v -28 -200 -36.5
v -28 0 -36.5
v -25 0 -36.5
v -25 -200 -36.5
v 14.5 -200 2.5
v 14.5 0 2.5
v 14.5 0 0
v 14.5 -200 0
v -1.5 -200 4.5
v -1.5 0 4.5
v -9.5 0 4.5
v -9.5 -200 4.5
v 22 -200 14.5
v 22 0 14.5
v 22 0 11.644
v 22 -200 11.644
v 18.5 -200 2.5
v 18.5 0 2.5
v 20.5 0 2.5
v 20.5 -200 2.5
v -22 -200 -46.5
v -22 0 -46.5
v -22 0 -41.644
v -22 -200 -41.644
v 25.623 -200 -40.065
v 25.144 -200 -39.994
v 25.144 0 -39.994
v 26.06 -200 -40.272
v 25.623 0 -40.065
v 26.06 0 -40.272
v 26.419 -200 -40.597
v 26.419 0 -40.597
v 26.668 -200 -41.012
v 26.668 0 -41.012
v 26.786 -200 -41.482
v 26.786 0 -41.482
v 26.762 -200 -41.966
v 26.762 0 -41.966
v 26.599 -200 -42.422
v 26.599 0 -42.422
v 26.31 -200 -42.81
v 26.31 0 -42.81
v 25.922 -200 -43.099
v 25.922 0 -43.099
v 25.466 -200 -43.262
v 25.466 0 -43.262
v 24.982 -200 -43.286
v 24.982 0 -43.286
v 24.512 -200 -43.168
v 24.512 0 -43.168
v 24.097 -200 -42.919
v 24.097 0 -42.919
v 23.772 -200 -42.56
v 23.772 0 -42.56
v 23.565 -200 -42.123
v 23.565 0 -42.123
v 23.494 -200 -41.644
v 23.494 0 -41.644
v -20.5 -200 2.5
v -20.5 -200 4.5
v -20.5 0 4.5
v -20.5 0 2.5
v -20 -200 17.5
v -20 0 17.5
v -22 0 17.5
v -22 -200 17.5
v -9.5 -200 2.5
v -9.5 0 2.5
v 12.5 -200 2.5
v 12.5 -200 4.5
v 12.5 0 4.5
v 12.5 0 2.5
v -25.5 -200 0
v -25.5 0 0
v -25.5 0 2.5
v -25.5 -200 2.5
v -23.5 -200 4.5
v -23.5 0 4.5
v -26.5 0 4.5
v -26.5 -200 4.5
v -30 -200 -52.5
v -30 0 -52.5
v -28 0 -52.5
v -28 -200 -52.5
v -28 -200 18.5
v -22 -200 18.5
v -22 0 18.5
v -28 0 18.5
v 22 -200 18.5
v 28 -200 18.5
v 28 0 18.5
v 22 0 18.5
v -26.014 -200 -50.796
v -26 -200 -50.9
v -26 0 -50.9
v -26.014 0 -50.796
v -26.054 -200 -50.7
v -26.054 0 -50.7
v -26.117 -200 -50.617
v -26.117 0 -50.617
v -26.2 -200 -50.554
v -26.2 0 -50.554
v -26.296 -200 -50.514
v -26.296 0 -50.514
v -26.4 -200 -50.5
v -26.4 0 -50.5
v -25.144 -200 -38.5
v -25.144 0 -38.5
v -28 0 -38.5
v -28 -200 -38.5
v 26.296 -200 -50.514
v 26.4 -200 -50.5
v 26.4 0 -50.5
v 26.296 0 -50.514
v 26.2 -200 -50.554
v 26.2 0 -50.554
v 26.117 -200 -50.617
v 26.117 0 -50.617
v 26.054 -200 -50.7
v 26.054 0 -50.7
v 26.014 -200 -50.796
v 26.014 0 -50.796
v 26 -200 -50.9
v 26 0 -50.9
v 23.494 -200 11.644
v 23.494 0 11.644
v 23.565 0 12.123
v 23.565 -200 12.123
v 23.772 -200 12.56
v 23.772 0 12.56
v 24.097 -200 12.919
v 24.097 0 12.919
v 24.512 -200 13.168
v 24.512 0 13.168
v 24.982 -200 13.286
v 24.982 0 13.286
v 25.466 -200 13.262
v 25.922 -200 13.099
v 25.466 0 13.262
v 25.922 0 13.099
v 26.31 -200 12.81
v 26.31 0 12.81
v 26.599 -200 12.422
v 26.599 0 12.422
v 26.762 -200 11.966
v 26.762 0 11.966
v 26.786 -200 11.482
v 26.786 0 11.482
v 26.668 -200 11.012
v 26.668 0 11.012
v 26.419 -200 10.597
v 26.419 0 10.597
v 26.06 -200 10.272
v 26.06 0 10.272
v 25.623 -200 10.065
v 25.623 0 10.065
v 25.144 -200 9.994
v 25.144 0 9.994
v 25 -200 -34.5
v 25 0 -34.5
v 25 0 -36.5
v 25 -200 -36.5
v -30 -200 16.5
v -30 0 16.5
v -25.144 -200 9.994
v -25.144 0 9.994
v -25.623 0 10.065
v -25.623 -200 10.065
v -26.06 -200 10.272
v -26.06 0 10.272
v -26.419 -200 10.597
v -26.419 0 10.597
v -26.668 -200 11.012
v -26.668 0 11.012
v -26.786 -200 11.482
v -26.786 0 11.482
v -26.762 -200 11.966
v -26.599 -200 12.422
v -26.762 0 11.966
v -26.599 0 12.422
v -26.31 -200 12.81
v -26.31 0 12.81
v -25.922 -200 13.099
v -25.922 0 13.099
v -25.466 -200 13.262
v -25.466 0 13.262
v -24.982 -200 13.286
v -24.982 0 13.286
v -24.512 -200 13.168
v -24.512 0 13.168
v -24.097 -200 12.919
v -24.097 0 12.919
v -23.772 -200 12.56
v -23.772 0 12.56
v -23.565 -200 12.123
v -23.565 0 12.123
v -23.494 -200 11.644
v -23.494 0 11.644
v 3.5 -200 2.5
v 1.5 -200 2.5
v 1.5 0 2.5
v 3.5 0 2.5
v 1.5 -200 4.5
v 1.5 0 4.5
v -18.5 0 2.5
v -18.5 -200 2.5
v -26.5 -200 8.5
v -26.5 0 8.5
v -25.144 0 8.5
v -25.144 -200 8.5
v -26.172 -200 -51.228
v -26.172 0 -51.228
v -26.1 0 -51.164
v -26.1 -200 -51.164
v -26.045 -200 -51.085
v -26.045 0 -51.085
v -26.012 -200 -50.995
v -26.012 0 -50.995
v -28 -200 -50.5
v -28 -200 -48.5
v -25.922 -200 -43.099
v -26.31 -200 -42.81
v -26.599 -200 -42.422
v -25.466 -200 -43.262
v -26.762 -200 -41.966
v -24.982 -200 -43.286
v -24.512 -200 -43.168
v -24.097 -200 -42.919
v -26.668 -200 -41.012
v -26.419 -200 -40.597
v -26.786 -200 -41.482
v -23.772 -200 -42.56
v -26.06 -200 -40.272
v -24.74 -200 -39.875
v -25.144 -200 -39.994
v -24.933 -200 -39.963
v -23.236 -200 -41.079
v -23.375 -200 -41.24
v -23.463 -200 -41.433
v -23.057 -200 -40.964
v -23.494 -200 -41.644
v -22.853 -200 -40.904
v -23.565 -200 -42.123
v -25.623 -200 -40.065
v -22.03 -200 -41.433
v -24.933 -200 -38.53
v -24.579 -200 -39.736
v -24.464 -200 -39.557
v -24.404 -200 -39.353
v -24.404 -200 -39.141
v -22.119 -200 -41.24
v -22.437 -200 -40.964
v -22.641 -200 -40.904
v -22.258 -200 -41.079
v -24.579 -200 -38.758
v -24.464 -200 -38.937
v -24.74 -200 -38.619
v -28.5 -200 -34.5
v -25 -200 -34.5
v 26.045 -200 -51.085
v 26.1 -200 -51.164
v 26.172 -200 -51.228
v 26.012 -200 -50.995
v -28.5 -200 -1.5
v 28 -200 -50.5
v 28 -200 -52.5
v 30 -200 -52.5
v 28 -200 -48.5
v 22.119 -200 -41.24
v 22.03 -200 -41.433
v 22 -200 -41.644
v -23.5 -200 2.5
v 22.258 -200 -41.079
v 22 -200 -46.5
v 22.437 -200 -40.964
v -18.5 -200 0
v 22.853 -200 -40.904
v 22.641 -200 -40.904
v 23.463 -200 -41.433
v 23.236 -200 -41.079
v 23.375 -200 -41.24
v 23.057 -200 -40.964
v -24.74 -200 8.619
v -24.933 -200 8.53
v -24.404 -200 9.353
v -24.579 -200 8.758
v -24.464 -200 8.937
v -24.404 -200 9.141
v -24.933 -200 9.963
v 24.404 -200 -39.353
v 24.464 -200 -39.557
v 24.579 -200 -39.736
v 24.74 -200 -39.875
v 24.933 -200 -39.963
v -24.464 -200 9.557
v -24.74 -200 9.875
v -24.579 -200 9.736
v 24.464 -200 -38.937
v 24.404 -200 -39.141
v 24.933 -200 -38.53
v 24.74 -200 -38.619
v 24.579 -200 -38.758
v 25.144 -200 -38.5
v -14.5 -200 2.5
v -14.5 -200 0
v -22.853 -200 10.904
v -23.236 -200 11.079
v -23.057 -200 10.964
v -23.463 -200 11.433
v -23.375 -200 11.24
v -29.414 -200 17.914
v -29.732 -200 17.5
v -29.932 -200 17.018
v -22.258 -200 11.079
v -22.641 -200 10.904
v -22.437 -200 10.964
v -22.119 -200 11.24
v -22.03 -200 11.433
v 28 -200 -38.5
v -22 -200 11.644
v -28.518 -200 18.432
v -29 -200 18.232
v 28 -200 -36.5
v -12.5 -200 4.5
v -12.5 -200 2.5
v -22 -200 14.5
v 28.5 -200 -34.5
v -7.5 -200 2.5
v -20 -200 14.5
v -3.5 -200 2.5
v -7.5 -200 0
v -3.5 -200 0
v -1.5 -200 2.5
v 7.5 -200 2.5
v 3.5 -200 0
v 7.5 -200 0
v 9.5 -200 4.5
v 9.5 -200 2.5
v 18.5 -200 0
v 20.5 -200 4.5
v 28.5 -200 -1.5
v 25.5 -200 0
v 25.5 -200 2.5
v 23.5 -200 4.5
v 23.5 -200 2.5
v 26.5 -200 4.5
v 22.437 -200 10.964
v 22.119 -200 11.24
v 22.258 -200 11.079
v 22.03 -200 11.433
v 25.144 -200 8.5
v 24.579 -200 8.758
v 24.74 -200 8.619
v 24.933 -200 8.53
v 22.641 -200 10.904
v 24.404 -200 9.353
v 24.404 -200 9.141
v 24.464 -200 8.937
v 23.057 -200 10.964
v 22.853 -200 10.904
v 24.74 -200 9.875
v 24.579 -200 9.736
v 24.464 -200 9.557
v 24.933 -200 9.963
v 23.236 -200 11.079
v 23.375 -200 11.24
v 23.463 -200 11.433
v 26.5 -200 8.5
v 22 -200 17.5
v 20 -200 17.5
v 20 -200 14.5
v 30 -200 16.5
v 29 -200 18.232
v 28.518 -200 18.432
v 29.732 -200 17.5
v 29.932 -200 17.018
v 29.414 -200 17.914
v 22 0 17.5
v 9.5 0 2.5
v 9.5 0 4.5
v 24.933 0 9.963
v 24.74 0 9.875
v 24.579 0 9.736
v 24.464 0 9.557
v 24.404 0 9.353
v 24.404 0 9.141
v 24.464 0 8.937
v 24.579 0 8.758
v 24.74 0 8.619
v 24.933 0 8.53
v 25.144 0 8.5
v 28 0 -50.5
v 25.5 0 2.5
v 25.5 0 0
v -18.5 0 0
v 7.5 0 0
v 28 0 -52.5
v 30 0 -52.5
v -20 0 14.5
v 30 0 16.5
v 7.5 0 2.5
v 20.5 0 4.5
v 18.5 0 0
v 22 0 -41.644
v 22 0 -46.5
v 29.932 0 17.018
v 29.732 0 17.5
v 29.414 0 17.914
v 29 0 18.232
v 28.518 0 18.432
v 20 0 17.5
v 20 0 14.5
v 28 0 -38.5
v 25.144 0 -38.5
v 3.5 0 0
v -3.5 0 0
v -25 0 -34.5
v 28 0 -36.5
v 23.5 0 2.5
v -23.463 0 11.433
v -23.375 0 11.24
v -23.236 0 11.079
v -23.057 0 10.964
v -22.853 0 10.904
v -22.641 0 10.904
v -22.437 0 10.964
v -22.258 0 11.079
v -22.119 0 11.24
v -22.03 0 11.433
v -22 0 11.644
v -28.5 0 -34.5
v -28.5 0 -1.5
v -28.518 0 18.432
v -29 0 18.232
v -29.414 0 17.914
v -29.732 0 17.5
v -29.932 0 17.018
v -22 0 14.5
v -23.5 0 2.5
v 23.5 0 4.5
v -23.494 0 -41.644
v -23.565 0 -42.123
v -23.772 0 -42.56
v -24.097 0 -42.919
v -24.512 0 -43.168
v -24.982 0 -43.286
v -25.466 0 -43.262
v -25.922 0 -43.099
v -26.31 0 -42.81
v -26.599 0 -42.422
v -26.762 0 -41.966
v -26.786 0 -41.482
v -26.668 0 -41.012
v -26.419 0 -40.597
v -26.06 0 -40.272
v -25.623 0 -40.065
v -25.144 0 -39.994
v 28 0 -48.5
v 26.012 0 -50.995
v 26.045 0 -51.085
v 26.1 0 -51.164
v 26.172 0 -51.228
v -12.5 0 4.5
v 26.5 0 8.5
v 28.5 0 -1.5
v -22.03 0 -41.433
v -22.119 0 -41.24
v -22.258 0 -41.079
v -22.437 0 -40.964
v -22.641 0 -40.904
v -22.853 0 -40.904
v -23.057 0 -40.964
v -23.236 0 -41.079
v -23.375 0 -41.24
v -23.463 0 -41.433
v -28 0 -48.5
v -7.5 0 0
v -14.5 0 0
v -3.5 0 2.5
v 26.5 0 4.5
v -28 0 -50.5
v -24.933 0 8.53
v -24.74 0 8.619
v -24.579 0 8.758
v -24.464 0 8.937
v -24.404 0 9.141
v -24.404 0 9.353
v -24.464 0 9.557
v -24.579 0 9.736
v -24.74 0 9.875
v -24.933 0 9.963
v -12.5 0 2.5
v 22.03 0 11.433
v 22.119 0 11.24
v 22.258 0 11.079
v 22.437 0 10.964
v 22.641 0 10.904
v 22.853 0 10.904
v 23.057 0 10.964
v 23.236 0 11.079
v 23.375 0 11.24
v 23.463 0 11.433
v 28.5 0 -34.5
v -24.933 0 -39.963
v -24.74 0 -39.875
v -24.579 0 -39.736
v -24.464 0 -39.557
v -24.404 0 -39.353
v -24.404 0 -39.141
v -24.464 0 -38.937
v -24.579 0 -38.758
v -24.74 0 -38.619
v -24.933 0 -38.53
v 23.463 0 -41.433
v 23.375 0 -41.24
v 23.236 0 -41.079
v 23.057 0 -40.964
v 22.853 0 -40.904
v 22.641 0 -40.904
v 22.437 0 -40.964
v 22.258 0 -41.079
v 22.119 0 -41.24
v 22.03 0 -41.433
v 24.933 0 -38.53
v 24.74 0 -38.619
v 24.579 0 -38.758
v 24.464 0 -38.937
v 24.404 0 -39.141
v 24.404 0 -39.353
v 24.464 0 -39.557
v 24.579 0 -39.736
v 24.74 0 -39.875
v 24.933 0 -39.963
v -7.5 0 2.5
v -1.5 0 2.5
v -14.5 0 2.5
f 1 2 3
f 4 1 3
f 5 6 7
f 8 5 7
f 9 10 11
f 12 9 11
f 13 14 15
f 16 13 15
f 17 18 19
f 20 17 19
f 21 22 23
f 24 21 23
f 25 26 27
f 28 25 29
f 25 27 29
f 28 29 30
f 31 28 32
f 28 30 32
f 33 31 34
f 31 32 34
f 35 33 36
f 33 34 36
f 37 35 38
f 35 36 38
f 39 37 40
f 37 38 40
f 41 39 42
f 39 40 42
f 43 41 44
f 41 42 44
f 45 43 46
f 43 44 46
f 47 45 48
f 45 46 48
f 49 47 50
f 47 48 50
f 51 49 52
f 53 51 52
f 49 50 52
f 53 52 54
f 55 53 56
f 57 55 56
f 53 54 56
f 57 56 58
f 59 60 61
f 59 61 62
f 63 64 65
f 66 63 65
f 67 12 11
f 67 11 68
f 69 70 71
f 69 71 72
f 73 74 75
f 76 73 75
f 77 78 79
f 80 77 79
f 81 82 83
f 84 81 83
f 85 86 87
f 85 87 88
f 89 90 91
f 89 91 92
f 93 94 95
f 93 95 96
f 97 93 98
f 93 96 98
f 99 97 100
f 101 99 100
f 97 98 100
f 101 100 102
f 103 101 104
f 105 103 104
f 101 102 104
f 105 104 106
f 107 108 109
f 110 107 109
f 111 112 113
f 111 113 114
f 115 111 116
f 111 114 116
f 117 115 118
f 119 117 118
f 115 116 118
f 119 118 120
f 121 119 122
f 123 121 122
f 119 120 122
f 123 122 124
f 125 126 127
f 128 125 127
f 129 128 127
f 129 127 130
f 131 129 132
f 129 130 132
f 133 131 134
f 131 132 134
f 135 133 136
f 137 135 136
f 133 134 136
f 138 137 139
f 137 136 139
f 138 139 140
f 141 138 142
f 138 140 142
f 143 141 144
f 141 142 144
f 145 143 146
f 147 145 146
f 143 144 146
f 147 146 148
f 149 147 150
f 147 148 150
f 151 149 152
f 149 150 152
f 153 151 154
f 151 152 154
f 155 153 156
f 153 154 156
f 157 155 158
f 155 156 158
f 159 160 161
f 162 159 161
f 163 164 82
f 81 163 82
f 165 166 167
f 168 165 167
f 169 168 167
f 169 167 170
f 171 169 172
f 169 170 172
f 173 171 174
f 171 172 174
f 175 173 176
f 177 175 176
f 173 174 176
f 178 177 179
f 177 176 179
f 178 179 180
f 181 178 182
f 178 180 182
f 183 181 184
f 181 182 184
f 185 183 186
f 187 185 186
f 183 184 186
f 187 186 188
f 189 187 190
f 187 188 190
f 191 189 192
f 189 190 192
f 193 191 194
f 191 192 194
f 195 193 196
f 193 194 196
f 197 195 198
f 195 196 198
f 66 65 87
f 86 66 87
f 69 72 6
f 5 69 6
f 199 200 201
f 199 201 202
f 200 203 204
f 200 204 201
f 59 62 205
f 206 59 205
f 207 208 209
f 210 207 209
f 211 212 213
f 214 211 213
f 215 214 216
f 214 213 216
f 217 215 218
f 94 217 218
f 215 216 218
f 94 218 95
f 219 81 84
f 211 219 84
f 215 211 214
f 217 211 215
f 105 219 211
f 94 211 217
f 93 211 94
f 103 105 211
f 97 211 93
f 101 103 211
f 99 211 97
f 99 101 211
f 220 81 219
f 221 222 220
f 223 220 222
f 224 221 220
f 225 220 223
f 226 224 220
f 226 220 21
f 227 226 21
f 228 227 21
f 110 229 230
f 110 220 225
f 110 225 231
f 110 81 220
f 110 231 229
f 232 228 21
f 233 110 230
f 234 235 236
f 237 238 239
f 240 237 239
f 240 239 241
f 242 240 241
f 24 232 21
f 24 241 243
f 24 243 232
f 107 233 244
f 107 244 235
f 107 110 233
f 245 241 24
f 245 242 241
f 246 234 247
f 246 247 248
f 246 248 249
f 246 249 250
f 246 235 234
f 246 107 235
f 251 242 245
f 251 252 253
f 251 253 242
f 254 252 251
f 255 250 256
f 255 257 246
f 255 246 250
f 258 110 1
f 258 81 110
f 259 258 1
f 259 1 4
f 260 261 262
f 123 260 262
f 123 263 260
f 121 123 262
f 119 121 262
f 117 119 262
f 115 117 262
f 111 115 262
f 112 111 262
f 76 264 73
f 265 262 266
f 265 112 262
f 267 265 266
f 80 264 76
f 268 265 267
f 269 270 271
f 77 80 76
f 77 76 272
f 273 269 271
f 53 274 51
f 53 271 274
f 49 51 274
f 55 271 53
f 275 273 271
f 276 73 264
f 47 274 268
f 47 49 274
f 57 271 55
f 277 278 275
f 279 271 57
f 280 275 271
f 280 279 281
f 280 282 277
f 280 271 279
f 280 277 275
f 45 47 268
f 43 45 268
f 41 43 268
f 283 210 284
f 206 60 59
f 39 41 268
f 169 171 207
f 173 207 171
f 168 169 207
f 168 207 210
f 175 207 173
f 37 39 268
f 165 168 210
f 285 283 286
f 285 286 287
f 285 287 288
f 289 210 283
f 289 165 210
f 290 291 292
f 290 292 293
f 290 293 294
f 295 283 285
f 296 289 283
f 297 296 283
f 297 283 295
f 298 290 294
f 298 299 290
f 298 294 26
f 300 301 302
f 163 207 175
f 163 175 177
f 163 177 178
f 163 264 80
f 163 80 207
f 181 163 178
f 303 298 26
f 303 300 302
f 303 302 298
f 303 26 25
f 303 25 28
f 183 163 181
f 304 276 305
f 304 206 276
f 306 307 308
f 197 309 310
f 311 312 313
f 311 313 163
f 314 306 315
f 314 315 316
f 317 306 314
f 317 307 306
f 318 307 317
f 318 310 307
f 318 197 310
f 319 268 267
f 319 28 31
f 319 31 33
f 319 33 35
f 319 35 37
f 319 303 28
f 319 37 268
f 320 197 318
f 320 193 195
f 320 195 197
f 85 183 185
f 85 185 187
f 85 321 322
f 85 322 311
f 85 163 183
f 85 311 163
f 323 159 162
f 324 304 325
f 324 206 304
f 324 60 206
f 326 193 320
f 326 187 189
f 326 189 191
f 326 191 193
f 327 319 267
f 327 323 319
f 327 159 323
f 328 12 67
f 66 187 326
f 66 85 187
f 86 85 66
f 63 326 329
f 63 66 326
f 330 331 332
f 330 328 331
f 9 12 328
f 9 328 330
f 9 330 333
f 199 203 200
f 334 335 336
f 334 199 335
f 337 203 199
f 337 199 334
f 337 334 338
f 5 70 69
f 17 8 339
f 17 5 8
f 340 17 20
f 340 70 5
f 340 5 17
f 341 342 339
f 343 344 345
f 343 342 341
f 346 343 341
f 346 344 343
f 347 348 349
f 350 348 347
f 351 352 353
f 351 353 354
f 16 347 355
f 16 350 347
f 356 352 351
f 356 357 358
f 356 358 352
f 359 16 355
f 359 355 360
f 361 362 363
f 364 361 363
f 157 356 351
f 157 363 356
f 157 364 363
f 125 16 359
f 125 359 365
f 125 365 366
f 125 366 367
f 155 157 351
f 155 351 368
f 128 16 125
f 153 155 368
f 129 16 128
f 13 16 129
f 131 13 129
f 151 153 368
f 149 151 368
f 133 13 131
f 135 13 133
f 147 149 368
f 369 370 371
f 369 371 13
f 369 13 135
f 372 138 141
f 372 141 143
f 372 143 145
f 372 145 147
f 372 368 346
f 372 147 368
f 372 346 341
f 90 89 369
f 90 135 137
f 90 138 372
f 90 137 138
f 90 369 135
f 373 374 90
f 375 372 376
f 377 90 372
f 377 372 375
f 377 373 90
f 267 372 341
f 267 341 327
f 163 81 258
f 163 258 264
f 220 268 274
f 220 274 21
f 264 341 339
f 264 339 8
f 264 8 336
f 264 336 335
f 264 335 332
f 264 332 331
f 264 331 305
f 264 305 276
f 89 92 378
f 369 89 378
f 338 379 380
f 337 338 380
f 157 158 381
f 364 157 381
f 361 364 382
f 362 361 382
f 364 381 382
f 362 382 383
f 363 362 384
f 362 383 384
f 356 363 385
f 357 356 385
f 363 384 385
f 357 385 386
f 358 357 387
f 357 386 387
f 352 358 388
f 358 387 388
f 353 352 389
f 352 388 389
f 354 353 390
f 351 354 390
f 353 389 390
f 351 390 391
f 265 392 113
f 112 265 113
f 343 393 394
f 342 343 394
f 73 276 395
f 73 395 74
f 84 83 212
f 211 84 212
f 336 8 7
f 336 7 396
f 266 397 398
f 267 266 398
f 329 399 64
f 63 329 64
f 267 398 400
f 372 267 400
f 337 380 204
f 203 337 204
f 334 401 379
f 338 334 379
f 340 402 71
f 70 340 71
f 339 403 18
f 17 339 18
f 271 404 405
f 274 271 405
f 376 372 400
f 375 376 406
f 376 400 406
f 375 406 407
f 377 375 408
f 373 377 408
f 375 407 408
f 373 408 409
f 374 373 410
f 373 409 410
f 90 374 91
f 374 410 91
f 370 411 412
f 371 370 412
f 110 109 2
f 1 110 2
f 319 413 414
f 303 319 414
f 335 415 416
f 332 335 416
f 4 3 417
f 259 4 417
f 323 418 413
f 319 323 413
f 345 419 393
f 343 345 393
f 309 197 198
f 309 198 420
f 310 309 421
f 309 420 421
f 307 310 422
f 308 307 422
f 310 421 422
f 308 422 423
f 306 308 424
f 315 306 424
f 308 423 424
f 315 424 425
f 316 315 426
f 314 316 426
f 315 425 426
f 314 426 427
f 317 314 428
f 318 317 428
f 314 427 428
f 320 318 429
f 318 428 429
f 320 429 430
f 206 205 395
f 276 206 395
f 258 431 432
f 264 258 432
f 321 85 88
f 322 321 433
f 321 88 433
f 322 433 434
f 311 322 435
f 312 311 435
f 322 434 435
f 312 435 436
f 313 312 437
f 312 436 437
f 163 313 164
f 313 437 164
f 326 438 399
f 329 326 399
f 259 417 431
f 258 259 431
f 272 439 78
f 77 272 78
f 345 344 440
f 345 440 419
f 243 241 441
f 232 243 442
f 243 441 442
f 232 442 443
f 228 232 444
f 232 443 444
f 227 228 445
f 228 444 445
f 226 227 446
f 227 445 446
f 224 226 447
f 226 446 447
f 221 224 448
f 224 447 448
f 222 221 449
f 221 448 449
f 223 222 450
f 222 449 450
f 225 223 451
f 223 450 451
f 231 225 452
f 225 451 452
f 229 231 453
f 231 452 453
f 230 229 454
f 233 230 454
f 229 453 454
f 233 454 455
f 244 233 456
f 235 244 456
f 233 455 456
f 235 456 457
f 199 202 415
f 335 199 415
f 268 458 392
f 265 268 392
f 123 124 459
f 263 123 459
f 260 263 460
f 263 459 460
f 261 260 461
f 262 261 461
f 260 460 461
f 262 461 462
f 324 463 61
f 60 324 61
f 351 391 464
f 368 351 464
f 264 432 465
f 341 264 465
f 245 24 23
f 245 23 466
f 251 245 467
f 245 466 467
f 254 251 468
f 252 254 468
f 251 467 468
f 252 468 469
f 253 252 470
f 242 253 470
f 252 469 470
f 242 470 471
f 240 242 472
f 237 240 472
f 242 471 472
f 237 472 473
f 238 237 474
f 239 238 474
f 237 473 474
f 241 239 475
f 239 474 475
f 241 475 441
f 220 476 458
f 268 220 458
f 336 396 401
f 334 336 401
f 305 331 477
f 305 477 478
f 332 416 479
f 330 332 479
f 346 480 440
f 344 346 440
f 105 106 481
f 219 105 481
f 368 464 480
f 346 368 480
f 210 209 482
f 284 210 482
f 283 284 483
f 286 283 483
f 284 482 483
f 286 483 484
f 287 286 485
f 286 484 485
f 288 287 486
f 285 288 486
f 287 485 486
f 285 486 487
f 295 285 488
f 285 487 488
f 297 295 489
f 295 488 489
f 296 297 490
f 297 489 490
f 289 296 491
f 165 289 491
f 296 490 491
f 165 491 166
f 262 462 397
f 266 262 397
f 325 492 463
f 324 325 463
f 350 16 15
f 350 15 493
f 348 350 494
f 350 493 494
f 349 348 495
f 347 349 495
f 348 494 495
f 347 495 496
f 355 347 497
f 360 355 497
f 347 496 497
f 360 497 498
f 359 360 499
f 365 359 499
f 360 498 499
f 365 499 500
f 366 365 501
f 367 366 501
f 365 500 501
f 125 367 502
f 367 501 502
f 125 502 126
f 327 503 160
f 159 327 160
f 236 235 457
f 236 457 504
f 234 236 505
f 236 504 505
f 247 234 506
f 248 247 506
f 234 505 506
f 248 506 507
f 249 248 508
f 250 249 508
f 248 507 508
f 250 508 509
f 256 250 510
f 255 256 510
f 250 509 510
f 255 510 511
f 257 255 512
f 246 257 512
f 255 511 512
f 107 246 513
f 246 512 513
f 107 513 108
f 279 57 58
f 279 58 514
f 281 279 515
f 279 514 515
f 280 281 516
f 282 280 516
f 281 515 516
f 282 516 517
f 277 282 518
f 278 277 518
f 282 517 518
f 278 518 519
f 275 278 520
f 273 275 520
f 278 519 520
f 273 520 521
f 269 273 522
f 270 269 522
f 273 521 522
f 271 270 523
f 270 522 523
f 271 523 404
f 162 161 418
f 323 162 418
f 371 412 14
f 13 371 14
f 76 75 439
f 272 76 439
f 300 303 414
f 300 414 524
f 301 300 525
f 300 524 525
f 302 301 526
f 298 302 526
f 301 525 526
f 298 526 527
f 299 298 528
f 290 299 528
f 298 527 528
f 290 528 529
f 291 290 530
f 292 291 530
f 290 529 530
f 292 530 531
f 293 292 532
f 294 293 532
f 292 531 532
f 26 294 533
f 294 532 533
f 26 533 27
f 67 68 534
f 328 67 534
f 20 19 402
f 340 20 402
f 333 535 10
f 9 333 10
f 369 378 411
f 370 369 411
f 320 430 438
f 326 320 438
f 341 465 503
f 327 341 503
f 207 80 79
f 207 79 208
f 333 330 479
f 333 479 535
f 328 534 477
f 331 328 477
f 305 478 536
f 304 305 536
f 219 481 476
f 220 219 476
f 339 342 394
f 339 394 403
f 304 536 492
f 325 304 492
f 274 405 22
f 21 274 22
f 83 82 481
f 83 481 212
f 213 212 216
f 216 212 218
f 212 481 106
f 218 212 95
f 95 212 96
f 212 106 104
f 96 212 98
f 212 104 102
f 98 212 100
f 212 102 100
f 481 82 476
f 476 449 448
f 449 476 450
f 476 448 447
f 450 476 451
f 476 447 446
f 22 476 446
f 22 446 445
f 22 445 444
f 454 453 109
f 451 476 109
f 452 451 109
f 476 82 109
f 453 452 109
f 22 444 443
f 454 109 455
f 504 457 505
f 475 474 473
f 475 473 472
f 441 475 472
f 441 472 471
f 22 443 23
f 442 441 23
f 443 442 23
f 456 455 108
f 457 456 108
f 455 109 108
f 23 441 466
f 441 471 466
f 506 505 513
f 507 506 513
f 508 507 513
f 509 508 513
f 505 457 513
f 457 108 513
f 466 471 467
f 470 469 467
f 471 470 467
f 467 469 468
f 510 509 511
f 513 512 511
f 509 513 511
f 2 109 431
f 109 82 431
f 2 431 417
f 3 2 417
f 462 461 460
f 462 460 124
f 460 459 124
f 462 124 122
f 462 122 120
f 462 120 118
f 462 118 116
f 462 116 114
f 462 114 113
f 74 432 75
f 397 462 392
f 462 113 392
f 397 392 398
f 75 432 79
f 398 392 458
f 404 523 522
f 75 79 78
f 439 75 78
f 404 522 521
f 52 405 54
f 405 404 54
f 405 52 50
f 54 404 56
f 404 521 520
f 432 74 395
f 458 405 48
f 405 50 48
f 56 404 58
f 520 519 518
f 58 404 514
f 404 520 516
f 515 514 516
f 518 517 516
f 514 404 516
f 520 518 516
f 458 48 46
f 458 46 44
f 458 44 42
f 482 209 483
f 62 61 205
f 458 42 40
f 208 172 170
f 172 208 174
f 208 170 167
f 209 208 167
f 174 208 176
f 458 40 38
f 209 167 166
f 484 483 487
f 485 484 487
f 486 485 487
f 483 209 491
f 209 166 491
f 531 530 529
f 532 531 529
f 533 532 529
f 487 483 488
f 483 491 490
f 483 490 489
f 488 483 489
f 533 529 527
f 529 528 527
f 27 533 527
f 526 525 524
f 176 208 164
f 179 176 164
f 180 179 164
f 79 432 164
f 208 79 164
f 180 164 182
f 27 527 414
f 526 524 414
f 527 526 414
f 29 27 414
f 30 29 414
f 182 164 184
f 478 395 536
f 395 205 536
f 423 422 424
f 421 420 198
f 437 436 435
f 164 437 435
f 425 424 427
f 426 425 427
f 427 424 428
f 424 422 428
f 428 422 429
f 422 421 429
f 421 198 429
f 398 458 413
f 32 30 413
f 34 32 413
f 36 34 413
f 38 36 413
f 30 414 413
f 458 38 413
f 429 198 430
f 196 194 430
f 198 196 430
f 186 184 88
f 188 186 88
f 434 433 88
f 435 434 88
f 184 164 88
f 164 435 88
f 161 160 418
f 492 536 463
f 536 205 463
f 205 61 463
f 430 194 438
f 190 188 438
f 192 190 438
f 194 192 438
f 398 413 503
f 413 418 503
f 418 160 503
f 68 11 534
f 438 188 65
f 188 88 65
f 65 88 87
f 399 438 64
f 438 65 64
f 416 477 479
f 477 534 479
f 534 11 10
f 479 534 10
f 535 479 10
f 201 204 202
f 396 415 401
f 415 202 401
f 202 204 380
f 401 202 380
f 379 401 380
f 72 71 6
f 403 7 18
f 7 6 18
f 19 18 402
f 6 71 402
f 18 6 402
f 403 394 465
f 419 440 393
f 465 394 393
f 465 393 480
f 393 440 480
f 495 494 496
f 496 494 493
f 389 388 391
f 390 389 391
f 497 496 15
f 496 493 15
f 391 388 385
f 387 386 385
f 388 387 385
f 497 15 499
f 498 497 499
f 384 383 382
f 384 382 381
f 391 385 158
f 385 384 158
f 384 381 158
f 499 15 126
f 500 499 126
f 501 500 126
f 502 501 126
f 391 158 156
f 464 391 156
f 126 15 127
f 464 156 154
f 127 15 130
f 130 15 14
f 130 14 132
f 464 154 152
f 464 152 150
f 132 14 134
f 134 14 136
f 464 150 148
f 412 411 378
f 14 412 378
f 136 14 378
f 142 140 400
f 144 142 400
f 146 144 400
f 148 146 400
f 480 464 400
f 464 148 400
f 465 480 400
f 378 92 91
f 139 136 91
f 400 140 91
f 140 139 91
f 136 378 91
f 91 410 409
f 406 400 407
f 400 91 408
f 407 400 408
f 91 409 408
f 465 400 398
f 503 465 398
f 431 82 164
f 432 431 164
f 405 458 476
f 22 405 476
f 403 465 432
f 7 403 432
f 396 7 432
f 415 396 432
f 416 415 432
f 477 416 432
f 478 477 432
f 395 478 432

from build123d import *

# Parameters (mm, degrees)
F1_DEPTH = 200


# Not quite as in the source:
# - ends of sketch curves that miss each other by under 0.0002 mm in the source are joined


with BuildPart() as f1:
    # F0 (on Front) → F1 (new body)
    with BuildSketch(Plane.XZ):
        with BuildLine():
            Line((26.171612, -51.228388), (28, -52.5))
            Line((28, -52.5), (30, -52.5))
            Line((30, -52.5), (30, 16.5))
            ThreePointArc((30, 16.5), (29.4142135624, 17.9142135624), (28, 18.5))
            Line((28, 18.5), (22, 18.5))
            Line((22, 18.5), (22, 17.5))
            Line((22, 17.5), (20, 17.5))
            Line((20, 17.5), (20, 14.5))
            Line((20, 14.5), (22, 14.5))
            Line((22, 14.5), (22, 11.643728))
            ThreePointArc((22, 11.643728), (22.746864, 10.896864), (23.493728, 11.643728))
            ThreePointArc((23.493728, 11.643728), (26.310454189, 12.810454189), (25.143728, 9.993728))
            ThreePointArc((25.143728, 9.993728), (24.396864, 9.246864), (25.143728, 8.5))
            Line((25.143728, 8.5), (26.5, 8.5))
            Line((26.5, 8.5), (26.5, 4.5))
            Line((26.5, 4.5), (23.5, 4.5))
            Line((23.5, 4.5), (23.5, 2.5))
            Line((23.5, 2.5), (25.5, 2.5))
            Line((25.5, 2.5), (25.5, 0))
            Line((25.5, 0), (18.5, 0))
            Line((18.5, 0), (18.5, 2.5))
            Line((18.5, 2.5), (20.5, 2.5))
            Line((20.5, 2.5), (20.5, 4.5))
            Line((20.5, 4.5), (12.5, 4.5))
            Line((12.5, 4.5), (12.5, 2.5))
            Line((12.5, 2.5), (14.5, 2.5))
            Line((14.5, 2.5), (14.5, 0))
            Line((14.5, 0), (7.5, 0))
            Line((7.5, 0), (7.5, 2.5))
            Line((7.5, 2.5), (9.5, 2.5))
            Line((9.5, 2.5), (9.5, 4.5))
            Line((9.5, 4.5), (1.5, 4.5))
            Line((1.5, 4.5), (1.5, 2.5))
            Line((1.5, 2.5), (3.5, 2.5))
            Line((3.5, 2.5), (3.5, 0))
            Line((3.5, 0), (-3.5, 0))
            Line((-3.5, 0), (-3.5, 2.5))
            Line((-3.5, 2.5), (-1.5, 2.5))
            Line((-1.5, 2.5), (-1.5, 4.5))
            Line((-1.5, 4.5), (-9.5, 4.5))
            Line((-9.5, 4.5), (-9.5, 2.5))
            Line((-9.5, 2.5), (-7.5, 2.5))
            Line((-7.5, 2.5), (-7.5, 0))
            Line((-7.5, 0), (-14.5, 0))
            Line((-14.5, 0), (-14.5, 2.5))
            Line((-14.5, 2.5), (-12.5, 2.5))
            Line((-12.5, 2.5), (-12.5, 4.5))
            Line((-12.5, 4.5), (-20.5, 4.5))
            Line((-20.5, 4.5), (-20.5, 2.5))
            Line((-20.5, 2.5), (-18.5, 2.5))
            Line((-18.5, 2.5), (-18.5, 0))
            Line((-18.5, 0), (-25.5, 0))
            Line((-25.5, 0), (-25.5, 2.5))
            Line((-25.5, 2.5), (-23.5, 2.5))
            Line((-23.5, 2.5), (-23.5, 4.5))
            Line((-23.5, 4.5), (-26.5, 4.5))
            Line((-26.5, 4.5), (-26.5, 8.5))
            Line((-26.5, 8.5), (-25.143728, 8.5))
            ThreePointArc((-25.143728, 8.5), (-24.396864, 9.246864), (-25.143728, 9.993728))
            ThreePointArc((-25.143728, 9.993728), (-26.310454189, 12.810454189), (-23.493728, 11.643728))
            ThreePointArc((-23.493728, 11.643728), (-22.746864, 10.896864), (-22, 11.643728))
            Line((-22, 11.643728), (-22, 14.5))
            Line((-22, 14.5), (-20, 14.5))
            Line((-20, 14.5), (-20, 17.5))
            Line((-20, 17.5), (-22, 17.5))
            Line((-22, 17.5), (-22, 18.5))
            Line((-22, 18.5), (-28, 18.5))
            ThreePointArc((-28, 18.5), (-29.4142135624, 17.9142135624), (-30, 16.5))
            Line((-30, 16.5), (-30, -52.5))
            Line((-30, -52.5), (-28, -52.5))
            Line((-28, -52.5), (-26.171612, -51.228388))
            ThreePointArc((-26.171612, -51.228388), (-26.0454895845, -51.0852629626), (-26, -50.9))
            ThreePointArc((-26, -50.9), (-26.1171572875, -50.6171572875), (-26.4, -50.5))
            Line((-26.4, -50.5), (-28, -50.5))
            Line((-28, -50.5), (-28, -48.5))
            Line((-28, -48.5), (28, -48.5))
            Line((28, -48.5), (28, -50.5))
            Line((28, -50.5), (26.4, -50.5))
            ThreePointArc((26.4, -50.5), (26.1171572875, -50.6171572875), (26, -50.9))
            ThreePointArc((26, -50.9), (26.0454895845, -51.0852629626), (26.171612, -51.228388))
        make_face()
        with BuildLine():
            Line((-22, -46.5), (-22, -41.643728))
            ThreePointArc((-22, -41.643728), (-22.746864, -40.896864), (-23.493728, -41.643728))
            ThreePointArc((-23.493728, -41.643728), (-26.310454189, -42.810454189), (-25.143728, -39.993728))
            ThreePointArc((-25.143728, -39.993728), (-24.396864, -39.246864), (-25.143728, -38.5))
            Line((-25.143728, -38.5), (-28, -38.5))
            Line((-28, -38.5), (-28, -36.5))
            Line((-28, -36.5), (-25, -36.5))
            Line((-25, -36.5), (-25, -34.5))
            Line((-25, -34.5), (-28.5, -34.5))
            Line((-28.5, -34.5), (-28.5, -1.5))
            Line((-28.5, -1.5), (28.5, -1.5))
            Line((28.5, -1.5), (28.5, -34.5))
            Line((28.5, -34.5), (25, -34.5))
            Line((25, -34.5), (25, -36.5))
            Line((25, -36.5), (28, -36.5))
            Line((28, -36.5), (28, -38.5))
            Line((28, -38.5), (25.143728, -38.5))
            ThreePointArc((25.143728, -38.5), (24.396864, -39.246864), (25.143728, -39.993728))
            ThreePointArc((25.143728, -39.993728), (26.310454189, -42.810454189), (23.493728, -41.643728))
            ThreePointArc((23.493728, -41.643728), (22.746864, -40.896864), (22, -41.643728))
            Line((22, -41.643728), (22, -46.5))
            Line((22, -46.5), (-22, -46.5))
        make_face(mode=Mode.SUBTRACT)
    extrude(amount=F1_DEPTH)


solid = f1.part
